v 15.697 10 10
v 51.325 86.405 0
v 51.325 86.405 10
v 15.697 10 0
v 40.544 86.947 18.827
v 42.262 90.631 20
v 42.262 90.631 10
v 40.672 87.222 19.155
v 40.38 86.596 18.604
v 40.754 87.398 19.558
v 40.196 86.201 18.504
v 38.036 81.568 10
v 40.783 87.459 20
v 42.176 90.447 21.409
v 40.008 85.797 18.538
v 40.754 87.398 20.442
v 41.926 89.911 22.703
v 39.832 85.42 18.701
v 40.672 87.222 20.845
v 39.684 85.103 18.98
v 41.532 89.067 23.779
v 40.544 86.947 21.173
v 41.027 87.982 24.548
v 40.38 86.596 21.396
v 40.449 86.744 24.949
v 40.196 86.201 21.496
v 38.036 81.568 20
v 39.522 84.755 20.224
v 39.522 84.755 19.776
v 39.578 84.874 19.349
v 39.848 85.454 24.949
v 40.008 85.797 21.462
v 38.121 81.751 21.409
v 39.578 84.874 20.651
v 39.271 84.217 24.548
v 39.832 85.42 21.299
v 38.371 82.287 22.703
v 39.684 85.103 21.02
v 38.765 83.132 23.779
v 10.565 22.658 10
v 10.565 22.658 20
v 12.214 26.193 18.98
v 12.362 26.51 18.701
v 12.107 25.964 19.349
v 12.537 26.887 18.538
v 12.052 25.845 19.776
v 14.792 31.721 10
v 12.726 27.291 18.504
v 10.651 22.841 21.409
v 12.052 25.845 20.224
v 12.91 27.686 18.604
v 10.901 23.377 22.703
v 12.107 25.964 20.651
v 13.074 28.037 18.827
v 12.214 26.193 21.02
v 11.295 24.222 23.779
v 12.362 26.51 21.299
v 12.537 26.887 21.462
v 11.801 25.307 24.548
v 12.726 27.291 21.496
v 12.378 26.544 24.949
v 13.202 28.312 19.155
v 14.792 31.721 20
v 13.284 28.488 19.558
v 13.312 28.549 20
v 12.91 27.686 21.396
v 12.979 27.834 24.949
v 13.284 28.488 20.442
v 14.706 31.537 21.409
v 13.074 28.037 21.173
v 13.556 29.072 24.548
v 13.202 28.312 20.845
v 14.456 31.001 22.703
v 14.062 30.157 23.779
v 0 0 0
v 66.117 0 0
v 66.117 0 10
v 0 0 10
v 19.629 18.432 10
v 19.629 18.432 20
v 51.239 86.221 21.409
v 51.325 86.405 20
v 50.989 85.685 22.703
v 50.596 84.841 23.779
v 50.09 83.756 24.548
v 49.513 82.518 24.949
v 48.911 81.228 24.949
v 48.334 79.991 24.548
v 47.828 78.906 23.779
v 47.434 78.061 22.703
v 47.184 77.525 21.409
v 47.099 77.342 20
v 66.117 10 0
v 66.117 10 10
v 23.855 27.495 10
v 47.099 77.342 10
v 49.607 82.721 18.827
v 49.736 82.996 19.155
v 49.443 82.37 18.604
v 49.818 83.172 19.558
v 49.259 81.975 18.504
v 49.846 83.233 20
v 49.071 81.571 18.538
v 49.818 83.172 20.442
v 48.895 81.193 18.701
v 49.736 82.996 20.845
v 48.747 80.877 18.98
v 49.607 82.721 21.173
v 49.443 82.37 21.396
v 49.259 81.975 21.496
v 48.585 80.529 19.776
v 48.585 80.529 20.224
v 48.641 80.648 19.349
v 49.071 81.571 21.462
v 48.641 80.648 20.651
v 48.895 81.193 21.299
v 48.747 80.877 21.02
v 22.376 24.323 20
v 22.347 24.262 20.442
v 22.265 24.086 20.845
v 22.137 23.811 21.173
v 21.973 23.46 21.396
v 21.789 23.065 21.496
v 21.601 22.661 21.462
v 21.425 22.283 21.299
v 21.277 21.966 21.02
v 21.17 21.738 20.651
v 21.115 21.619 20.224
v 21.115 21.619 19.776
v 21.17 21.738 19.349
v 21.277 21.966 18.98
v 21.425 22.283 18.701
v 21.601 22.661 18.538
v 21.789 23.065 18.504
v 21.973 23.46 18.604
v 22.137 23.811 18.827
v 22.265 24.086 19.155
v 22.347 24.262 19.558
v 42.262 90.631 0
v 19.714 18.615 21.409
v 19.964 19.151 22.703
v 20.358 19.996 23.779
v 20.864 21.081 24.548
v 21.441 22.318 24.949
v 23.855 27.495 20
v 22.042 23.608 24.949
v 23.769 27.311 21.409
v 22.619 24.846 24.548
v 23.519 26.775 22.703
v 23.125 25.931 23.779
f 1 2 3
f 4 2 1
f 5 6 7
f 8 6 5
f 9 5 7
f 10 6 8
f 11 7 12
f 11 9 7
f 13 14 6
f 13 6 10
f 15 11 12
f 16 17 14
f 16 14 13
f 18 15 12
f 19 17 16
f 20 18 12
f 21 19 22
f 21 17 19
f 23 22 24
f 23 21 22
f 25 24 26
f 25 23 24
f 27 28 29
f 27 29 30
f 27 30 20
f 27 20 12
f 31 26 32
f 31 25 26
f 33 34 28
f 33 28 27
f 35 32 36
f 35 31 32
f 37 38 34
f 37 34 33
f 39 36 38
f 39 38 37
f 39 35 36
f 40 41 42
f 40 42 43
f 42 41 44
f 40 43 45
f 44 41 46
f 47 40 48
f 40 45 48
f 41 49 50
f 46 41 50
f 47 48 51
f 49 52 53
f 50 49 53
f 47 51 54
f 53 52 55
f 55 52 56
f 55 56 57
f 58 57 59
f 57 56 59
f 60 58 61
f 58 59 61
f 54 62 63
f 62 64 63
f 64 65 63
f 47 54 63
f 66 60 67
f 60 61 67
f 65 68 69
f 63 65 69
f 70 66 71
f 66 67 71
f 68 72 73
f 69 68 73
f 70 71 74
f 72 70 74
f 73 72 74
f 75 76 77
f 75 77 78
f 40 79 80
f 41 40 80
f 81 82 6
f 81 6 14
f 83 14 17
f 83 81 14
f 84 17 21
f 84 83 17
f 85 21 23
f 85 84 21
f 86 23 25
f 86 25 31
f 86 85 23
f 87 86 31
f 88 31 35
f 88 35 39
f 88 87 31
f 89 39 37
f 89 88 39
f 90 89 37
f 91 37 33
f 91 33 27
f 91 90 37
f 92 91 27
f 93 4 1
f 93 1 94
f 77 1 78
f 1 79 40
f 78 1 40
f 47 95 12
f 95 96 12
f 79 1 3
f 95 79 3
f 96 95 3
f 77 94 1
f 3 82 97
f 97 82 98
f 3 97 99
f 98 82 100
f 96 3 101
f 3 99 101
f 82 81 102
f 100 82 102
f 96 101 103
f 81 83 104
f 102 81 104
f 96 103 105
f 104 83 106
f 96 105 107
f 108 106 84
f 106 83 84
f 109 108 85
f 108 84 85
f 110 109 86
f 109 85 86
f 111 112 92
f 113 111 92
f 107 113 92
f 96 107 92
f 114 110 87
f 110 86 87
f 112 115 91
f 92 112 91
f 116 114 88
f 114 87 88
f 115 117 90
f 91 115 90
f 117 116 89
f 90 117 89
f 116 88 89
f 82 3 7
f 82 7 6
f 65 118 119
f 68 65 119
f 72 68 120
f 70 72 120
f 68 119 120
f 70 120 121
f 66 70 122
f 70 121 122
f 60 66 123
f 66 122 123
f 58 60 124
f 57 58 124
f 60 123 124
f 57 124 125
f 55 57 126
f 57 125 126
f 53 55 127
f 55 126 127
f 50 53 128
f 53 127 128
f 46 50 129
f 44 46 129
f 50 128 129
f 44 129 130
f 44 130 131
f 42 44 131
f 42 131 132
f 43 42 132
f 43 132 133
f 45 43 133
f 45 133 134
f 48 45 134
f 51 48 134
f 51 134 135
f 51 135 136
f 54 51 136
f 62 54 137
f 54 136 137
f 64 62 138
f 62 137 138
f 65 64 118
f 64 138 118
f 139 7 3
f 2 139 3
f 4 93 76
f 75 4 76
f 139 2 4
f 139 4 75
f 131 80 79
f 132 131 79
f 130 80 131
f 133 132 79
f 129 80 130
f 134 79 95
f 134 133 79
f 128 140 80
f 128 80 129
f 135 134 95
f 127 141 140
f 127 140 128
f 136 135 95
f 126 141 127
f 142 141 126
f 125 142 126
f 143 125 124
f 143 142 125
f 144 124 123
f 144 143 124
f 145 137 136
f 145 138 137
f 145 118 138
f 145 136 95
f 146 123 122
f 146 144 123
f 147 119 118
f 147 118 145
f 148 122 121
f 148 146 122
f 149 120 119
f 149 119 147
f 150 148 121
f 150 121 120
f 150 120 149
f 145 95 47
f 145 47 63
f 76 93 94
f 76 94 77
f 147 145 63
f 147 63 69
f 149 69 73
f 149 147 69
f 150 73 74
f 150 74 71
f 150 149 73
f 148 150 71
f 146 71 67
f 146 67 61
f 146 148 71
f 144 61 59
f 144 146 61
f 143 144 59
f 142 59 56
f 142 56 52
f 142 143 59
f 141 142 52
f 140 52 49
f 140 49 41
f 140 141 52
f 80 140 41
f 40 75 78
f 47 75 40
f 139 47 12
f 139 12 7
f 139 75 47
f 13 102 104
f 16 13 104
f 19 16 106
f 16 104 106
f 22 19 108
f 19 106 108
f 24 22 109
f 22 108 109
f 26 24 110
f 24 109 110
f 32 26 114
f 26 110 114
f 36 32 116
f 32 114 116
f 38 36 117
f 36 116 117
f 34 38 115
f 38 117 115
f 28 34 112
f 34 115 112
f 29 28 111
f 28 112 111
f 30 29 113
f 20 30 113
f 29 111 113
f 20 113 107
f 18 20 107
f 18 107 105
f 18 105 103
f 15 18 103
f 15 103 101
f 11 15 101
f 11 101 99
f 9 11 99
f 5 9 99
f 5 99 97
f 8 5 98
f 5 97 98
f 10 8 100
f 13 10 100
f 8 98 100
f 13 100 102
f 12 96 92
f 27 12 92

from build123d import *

# Parameters (mm, degrees)
PAD_DEPTH    = 10
SKETCH001_R  = 1.5
PAD001_DEPTH = 10


with BuildPart() as part:
    # Sketch → Pad (new body)
    with BuildSketch(Plane.XY):
        Polygon((66.116543, 0), (0, 0), (42.261826, 90.630779), (51.324904, 86.404596), (15.696856, 10), (66.116543, 10), align=None)
    extrude(amount=PAD_DEPTH)

    # Sketch001 (on Face4 of Pad) → Pad001 (join)
    with BuildSketch(Plane(origin=(9.063078, -4.226183, 0), x_dir=(0.422618, 0.906308, 0), z_dir=(0.906308, -0.422618, 0))):
        with BuildLine():
            Line((100, 10), (90, 10))
            Line((90, 10), (90, 20))
            ThreePointArc((100, 20), (95, 25), (90, 20))
            Line((100, 10), (100, 20))
        make_face()
        with Locations((95, 20)):
            Circle(SKETCH001_R, mode=Mode.SUBTRACT)
        with BuildLine():
            Line((35, 10), (35, 20))
            ThreePointArc((35, 20), (30, 25), (25, 20))
            Line((25, 10), (25, 20))
            Line((35, 10), (25, 10))
        make_face()
        with Locations((30, 20)):
            Circle(SKETCH001_R, mode=Mode.SUBTRACT)
    extrude(amount=-PAD001_DEPTH)


solid = part.part
